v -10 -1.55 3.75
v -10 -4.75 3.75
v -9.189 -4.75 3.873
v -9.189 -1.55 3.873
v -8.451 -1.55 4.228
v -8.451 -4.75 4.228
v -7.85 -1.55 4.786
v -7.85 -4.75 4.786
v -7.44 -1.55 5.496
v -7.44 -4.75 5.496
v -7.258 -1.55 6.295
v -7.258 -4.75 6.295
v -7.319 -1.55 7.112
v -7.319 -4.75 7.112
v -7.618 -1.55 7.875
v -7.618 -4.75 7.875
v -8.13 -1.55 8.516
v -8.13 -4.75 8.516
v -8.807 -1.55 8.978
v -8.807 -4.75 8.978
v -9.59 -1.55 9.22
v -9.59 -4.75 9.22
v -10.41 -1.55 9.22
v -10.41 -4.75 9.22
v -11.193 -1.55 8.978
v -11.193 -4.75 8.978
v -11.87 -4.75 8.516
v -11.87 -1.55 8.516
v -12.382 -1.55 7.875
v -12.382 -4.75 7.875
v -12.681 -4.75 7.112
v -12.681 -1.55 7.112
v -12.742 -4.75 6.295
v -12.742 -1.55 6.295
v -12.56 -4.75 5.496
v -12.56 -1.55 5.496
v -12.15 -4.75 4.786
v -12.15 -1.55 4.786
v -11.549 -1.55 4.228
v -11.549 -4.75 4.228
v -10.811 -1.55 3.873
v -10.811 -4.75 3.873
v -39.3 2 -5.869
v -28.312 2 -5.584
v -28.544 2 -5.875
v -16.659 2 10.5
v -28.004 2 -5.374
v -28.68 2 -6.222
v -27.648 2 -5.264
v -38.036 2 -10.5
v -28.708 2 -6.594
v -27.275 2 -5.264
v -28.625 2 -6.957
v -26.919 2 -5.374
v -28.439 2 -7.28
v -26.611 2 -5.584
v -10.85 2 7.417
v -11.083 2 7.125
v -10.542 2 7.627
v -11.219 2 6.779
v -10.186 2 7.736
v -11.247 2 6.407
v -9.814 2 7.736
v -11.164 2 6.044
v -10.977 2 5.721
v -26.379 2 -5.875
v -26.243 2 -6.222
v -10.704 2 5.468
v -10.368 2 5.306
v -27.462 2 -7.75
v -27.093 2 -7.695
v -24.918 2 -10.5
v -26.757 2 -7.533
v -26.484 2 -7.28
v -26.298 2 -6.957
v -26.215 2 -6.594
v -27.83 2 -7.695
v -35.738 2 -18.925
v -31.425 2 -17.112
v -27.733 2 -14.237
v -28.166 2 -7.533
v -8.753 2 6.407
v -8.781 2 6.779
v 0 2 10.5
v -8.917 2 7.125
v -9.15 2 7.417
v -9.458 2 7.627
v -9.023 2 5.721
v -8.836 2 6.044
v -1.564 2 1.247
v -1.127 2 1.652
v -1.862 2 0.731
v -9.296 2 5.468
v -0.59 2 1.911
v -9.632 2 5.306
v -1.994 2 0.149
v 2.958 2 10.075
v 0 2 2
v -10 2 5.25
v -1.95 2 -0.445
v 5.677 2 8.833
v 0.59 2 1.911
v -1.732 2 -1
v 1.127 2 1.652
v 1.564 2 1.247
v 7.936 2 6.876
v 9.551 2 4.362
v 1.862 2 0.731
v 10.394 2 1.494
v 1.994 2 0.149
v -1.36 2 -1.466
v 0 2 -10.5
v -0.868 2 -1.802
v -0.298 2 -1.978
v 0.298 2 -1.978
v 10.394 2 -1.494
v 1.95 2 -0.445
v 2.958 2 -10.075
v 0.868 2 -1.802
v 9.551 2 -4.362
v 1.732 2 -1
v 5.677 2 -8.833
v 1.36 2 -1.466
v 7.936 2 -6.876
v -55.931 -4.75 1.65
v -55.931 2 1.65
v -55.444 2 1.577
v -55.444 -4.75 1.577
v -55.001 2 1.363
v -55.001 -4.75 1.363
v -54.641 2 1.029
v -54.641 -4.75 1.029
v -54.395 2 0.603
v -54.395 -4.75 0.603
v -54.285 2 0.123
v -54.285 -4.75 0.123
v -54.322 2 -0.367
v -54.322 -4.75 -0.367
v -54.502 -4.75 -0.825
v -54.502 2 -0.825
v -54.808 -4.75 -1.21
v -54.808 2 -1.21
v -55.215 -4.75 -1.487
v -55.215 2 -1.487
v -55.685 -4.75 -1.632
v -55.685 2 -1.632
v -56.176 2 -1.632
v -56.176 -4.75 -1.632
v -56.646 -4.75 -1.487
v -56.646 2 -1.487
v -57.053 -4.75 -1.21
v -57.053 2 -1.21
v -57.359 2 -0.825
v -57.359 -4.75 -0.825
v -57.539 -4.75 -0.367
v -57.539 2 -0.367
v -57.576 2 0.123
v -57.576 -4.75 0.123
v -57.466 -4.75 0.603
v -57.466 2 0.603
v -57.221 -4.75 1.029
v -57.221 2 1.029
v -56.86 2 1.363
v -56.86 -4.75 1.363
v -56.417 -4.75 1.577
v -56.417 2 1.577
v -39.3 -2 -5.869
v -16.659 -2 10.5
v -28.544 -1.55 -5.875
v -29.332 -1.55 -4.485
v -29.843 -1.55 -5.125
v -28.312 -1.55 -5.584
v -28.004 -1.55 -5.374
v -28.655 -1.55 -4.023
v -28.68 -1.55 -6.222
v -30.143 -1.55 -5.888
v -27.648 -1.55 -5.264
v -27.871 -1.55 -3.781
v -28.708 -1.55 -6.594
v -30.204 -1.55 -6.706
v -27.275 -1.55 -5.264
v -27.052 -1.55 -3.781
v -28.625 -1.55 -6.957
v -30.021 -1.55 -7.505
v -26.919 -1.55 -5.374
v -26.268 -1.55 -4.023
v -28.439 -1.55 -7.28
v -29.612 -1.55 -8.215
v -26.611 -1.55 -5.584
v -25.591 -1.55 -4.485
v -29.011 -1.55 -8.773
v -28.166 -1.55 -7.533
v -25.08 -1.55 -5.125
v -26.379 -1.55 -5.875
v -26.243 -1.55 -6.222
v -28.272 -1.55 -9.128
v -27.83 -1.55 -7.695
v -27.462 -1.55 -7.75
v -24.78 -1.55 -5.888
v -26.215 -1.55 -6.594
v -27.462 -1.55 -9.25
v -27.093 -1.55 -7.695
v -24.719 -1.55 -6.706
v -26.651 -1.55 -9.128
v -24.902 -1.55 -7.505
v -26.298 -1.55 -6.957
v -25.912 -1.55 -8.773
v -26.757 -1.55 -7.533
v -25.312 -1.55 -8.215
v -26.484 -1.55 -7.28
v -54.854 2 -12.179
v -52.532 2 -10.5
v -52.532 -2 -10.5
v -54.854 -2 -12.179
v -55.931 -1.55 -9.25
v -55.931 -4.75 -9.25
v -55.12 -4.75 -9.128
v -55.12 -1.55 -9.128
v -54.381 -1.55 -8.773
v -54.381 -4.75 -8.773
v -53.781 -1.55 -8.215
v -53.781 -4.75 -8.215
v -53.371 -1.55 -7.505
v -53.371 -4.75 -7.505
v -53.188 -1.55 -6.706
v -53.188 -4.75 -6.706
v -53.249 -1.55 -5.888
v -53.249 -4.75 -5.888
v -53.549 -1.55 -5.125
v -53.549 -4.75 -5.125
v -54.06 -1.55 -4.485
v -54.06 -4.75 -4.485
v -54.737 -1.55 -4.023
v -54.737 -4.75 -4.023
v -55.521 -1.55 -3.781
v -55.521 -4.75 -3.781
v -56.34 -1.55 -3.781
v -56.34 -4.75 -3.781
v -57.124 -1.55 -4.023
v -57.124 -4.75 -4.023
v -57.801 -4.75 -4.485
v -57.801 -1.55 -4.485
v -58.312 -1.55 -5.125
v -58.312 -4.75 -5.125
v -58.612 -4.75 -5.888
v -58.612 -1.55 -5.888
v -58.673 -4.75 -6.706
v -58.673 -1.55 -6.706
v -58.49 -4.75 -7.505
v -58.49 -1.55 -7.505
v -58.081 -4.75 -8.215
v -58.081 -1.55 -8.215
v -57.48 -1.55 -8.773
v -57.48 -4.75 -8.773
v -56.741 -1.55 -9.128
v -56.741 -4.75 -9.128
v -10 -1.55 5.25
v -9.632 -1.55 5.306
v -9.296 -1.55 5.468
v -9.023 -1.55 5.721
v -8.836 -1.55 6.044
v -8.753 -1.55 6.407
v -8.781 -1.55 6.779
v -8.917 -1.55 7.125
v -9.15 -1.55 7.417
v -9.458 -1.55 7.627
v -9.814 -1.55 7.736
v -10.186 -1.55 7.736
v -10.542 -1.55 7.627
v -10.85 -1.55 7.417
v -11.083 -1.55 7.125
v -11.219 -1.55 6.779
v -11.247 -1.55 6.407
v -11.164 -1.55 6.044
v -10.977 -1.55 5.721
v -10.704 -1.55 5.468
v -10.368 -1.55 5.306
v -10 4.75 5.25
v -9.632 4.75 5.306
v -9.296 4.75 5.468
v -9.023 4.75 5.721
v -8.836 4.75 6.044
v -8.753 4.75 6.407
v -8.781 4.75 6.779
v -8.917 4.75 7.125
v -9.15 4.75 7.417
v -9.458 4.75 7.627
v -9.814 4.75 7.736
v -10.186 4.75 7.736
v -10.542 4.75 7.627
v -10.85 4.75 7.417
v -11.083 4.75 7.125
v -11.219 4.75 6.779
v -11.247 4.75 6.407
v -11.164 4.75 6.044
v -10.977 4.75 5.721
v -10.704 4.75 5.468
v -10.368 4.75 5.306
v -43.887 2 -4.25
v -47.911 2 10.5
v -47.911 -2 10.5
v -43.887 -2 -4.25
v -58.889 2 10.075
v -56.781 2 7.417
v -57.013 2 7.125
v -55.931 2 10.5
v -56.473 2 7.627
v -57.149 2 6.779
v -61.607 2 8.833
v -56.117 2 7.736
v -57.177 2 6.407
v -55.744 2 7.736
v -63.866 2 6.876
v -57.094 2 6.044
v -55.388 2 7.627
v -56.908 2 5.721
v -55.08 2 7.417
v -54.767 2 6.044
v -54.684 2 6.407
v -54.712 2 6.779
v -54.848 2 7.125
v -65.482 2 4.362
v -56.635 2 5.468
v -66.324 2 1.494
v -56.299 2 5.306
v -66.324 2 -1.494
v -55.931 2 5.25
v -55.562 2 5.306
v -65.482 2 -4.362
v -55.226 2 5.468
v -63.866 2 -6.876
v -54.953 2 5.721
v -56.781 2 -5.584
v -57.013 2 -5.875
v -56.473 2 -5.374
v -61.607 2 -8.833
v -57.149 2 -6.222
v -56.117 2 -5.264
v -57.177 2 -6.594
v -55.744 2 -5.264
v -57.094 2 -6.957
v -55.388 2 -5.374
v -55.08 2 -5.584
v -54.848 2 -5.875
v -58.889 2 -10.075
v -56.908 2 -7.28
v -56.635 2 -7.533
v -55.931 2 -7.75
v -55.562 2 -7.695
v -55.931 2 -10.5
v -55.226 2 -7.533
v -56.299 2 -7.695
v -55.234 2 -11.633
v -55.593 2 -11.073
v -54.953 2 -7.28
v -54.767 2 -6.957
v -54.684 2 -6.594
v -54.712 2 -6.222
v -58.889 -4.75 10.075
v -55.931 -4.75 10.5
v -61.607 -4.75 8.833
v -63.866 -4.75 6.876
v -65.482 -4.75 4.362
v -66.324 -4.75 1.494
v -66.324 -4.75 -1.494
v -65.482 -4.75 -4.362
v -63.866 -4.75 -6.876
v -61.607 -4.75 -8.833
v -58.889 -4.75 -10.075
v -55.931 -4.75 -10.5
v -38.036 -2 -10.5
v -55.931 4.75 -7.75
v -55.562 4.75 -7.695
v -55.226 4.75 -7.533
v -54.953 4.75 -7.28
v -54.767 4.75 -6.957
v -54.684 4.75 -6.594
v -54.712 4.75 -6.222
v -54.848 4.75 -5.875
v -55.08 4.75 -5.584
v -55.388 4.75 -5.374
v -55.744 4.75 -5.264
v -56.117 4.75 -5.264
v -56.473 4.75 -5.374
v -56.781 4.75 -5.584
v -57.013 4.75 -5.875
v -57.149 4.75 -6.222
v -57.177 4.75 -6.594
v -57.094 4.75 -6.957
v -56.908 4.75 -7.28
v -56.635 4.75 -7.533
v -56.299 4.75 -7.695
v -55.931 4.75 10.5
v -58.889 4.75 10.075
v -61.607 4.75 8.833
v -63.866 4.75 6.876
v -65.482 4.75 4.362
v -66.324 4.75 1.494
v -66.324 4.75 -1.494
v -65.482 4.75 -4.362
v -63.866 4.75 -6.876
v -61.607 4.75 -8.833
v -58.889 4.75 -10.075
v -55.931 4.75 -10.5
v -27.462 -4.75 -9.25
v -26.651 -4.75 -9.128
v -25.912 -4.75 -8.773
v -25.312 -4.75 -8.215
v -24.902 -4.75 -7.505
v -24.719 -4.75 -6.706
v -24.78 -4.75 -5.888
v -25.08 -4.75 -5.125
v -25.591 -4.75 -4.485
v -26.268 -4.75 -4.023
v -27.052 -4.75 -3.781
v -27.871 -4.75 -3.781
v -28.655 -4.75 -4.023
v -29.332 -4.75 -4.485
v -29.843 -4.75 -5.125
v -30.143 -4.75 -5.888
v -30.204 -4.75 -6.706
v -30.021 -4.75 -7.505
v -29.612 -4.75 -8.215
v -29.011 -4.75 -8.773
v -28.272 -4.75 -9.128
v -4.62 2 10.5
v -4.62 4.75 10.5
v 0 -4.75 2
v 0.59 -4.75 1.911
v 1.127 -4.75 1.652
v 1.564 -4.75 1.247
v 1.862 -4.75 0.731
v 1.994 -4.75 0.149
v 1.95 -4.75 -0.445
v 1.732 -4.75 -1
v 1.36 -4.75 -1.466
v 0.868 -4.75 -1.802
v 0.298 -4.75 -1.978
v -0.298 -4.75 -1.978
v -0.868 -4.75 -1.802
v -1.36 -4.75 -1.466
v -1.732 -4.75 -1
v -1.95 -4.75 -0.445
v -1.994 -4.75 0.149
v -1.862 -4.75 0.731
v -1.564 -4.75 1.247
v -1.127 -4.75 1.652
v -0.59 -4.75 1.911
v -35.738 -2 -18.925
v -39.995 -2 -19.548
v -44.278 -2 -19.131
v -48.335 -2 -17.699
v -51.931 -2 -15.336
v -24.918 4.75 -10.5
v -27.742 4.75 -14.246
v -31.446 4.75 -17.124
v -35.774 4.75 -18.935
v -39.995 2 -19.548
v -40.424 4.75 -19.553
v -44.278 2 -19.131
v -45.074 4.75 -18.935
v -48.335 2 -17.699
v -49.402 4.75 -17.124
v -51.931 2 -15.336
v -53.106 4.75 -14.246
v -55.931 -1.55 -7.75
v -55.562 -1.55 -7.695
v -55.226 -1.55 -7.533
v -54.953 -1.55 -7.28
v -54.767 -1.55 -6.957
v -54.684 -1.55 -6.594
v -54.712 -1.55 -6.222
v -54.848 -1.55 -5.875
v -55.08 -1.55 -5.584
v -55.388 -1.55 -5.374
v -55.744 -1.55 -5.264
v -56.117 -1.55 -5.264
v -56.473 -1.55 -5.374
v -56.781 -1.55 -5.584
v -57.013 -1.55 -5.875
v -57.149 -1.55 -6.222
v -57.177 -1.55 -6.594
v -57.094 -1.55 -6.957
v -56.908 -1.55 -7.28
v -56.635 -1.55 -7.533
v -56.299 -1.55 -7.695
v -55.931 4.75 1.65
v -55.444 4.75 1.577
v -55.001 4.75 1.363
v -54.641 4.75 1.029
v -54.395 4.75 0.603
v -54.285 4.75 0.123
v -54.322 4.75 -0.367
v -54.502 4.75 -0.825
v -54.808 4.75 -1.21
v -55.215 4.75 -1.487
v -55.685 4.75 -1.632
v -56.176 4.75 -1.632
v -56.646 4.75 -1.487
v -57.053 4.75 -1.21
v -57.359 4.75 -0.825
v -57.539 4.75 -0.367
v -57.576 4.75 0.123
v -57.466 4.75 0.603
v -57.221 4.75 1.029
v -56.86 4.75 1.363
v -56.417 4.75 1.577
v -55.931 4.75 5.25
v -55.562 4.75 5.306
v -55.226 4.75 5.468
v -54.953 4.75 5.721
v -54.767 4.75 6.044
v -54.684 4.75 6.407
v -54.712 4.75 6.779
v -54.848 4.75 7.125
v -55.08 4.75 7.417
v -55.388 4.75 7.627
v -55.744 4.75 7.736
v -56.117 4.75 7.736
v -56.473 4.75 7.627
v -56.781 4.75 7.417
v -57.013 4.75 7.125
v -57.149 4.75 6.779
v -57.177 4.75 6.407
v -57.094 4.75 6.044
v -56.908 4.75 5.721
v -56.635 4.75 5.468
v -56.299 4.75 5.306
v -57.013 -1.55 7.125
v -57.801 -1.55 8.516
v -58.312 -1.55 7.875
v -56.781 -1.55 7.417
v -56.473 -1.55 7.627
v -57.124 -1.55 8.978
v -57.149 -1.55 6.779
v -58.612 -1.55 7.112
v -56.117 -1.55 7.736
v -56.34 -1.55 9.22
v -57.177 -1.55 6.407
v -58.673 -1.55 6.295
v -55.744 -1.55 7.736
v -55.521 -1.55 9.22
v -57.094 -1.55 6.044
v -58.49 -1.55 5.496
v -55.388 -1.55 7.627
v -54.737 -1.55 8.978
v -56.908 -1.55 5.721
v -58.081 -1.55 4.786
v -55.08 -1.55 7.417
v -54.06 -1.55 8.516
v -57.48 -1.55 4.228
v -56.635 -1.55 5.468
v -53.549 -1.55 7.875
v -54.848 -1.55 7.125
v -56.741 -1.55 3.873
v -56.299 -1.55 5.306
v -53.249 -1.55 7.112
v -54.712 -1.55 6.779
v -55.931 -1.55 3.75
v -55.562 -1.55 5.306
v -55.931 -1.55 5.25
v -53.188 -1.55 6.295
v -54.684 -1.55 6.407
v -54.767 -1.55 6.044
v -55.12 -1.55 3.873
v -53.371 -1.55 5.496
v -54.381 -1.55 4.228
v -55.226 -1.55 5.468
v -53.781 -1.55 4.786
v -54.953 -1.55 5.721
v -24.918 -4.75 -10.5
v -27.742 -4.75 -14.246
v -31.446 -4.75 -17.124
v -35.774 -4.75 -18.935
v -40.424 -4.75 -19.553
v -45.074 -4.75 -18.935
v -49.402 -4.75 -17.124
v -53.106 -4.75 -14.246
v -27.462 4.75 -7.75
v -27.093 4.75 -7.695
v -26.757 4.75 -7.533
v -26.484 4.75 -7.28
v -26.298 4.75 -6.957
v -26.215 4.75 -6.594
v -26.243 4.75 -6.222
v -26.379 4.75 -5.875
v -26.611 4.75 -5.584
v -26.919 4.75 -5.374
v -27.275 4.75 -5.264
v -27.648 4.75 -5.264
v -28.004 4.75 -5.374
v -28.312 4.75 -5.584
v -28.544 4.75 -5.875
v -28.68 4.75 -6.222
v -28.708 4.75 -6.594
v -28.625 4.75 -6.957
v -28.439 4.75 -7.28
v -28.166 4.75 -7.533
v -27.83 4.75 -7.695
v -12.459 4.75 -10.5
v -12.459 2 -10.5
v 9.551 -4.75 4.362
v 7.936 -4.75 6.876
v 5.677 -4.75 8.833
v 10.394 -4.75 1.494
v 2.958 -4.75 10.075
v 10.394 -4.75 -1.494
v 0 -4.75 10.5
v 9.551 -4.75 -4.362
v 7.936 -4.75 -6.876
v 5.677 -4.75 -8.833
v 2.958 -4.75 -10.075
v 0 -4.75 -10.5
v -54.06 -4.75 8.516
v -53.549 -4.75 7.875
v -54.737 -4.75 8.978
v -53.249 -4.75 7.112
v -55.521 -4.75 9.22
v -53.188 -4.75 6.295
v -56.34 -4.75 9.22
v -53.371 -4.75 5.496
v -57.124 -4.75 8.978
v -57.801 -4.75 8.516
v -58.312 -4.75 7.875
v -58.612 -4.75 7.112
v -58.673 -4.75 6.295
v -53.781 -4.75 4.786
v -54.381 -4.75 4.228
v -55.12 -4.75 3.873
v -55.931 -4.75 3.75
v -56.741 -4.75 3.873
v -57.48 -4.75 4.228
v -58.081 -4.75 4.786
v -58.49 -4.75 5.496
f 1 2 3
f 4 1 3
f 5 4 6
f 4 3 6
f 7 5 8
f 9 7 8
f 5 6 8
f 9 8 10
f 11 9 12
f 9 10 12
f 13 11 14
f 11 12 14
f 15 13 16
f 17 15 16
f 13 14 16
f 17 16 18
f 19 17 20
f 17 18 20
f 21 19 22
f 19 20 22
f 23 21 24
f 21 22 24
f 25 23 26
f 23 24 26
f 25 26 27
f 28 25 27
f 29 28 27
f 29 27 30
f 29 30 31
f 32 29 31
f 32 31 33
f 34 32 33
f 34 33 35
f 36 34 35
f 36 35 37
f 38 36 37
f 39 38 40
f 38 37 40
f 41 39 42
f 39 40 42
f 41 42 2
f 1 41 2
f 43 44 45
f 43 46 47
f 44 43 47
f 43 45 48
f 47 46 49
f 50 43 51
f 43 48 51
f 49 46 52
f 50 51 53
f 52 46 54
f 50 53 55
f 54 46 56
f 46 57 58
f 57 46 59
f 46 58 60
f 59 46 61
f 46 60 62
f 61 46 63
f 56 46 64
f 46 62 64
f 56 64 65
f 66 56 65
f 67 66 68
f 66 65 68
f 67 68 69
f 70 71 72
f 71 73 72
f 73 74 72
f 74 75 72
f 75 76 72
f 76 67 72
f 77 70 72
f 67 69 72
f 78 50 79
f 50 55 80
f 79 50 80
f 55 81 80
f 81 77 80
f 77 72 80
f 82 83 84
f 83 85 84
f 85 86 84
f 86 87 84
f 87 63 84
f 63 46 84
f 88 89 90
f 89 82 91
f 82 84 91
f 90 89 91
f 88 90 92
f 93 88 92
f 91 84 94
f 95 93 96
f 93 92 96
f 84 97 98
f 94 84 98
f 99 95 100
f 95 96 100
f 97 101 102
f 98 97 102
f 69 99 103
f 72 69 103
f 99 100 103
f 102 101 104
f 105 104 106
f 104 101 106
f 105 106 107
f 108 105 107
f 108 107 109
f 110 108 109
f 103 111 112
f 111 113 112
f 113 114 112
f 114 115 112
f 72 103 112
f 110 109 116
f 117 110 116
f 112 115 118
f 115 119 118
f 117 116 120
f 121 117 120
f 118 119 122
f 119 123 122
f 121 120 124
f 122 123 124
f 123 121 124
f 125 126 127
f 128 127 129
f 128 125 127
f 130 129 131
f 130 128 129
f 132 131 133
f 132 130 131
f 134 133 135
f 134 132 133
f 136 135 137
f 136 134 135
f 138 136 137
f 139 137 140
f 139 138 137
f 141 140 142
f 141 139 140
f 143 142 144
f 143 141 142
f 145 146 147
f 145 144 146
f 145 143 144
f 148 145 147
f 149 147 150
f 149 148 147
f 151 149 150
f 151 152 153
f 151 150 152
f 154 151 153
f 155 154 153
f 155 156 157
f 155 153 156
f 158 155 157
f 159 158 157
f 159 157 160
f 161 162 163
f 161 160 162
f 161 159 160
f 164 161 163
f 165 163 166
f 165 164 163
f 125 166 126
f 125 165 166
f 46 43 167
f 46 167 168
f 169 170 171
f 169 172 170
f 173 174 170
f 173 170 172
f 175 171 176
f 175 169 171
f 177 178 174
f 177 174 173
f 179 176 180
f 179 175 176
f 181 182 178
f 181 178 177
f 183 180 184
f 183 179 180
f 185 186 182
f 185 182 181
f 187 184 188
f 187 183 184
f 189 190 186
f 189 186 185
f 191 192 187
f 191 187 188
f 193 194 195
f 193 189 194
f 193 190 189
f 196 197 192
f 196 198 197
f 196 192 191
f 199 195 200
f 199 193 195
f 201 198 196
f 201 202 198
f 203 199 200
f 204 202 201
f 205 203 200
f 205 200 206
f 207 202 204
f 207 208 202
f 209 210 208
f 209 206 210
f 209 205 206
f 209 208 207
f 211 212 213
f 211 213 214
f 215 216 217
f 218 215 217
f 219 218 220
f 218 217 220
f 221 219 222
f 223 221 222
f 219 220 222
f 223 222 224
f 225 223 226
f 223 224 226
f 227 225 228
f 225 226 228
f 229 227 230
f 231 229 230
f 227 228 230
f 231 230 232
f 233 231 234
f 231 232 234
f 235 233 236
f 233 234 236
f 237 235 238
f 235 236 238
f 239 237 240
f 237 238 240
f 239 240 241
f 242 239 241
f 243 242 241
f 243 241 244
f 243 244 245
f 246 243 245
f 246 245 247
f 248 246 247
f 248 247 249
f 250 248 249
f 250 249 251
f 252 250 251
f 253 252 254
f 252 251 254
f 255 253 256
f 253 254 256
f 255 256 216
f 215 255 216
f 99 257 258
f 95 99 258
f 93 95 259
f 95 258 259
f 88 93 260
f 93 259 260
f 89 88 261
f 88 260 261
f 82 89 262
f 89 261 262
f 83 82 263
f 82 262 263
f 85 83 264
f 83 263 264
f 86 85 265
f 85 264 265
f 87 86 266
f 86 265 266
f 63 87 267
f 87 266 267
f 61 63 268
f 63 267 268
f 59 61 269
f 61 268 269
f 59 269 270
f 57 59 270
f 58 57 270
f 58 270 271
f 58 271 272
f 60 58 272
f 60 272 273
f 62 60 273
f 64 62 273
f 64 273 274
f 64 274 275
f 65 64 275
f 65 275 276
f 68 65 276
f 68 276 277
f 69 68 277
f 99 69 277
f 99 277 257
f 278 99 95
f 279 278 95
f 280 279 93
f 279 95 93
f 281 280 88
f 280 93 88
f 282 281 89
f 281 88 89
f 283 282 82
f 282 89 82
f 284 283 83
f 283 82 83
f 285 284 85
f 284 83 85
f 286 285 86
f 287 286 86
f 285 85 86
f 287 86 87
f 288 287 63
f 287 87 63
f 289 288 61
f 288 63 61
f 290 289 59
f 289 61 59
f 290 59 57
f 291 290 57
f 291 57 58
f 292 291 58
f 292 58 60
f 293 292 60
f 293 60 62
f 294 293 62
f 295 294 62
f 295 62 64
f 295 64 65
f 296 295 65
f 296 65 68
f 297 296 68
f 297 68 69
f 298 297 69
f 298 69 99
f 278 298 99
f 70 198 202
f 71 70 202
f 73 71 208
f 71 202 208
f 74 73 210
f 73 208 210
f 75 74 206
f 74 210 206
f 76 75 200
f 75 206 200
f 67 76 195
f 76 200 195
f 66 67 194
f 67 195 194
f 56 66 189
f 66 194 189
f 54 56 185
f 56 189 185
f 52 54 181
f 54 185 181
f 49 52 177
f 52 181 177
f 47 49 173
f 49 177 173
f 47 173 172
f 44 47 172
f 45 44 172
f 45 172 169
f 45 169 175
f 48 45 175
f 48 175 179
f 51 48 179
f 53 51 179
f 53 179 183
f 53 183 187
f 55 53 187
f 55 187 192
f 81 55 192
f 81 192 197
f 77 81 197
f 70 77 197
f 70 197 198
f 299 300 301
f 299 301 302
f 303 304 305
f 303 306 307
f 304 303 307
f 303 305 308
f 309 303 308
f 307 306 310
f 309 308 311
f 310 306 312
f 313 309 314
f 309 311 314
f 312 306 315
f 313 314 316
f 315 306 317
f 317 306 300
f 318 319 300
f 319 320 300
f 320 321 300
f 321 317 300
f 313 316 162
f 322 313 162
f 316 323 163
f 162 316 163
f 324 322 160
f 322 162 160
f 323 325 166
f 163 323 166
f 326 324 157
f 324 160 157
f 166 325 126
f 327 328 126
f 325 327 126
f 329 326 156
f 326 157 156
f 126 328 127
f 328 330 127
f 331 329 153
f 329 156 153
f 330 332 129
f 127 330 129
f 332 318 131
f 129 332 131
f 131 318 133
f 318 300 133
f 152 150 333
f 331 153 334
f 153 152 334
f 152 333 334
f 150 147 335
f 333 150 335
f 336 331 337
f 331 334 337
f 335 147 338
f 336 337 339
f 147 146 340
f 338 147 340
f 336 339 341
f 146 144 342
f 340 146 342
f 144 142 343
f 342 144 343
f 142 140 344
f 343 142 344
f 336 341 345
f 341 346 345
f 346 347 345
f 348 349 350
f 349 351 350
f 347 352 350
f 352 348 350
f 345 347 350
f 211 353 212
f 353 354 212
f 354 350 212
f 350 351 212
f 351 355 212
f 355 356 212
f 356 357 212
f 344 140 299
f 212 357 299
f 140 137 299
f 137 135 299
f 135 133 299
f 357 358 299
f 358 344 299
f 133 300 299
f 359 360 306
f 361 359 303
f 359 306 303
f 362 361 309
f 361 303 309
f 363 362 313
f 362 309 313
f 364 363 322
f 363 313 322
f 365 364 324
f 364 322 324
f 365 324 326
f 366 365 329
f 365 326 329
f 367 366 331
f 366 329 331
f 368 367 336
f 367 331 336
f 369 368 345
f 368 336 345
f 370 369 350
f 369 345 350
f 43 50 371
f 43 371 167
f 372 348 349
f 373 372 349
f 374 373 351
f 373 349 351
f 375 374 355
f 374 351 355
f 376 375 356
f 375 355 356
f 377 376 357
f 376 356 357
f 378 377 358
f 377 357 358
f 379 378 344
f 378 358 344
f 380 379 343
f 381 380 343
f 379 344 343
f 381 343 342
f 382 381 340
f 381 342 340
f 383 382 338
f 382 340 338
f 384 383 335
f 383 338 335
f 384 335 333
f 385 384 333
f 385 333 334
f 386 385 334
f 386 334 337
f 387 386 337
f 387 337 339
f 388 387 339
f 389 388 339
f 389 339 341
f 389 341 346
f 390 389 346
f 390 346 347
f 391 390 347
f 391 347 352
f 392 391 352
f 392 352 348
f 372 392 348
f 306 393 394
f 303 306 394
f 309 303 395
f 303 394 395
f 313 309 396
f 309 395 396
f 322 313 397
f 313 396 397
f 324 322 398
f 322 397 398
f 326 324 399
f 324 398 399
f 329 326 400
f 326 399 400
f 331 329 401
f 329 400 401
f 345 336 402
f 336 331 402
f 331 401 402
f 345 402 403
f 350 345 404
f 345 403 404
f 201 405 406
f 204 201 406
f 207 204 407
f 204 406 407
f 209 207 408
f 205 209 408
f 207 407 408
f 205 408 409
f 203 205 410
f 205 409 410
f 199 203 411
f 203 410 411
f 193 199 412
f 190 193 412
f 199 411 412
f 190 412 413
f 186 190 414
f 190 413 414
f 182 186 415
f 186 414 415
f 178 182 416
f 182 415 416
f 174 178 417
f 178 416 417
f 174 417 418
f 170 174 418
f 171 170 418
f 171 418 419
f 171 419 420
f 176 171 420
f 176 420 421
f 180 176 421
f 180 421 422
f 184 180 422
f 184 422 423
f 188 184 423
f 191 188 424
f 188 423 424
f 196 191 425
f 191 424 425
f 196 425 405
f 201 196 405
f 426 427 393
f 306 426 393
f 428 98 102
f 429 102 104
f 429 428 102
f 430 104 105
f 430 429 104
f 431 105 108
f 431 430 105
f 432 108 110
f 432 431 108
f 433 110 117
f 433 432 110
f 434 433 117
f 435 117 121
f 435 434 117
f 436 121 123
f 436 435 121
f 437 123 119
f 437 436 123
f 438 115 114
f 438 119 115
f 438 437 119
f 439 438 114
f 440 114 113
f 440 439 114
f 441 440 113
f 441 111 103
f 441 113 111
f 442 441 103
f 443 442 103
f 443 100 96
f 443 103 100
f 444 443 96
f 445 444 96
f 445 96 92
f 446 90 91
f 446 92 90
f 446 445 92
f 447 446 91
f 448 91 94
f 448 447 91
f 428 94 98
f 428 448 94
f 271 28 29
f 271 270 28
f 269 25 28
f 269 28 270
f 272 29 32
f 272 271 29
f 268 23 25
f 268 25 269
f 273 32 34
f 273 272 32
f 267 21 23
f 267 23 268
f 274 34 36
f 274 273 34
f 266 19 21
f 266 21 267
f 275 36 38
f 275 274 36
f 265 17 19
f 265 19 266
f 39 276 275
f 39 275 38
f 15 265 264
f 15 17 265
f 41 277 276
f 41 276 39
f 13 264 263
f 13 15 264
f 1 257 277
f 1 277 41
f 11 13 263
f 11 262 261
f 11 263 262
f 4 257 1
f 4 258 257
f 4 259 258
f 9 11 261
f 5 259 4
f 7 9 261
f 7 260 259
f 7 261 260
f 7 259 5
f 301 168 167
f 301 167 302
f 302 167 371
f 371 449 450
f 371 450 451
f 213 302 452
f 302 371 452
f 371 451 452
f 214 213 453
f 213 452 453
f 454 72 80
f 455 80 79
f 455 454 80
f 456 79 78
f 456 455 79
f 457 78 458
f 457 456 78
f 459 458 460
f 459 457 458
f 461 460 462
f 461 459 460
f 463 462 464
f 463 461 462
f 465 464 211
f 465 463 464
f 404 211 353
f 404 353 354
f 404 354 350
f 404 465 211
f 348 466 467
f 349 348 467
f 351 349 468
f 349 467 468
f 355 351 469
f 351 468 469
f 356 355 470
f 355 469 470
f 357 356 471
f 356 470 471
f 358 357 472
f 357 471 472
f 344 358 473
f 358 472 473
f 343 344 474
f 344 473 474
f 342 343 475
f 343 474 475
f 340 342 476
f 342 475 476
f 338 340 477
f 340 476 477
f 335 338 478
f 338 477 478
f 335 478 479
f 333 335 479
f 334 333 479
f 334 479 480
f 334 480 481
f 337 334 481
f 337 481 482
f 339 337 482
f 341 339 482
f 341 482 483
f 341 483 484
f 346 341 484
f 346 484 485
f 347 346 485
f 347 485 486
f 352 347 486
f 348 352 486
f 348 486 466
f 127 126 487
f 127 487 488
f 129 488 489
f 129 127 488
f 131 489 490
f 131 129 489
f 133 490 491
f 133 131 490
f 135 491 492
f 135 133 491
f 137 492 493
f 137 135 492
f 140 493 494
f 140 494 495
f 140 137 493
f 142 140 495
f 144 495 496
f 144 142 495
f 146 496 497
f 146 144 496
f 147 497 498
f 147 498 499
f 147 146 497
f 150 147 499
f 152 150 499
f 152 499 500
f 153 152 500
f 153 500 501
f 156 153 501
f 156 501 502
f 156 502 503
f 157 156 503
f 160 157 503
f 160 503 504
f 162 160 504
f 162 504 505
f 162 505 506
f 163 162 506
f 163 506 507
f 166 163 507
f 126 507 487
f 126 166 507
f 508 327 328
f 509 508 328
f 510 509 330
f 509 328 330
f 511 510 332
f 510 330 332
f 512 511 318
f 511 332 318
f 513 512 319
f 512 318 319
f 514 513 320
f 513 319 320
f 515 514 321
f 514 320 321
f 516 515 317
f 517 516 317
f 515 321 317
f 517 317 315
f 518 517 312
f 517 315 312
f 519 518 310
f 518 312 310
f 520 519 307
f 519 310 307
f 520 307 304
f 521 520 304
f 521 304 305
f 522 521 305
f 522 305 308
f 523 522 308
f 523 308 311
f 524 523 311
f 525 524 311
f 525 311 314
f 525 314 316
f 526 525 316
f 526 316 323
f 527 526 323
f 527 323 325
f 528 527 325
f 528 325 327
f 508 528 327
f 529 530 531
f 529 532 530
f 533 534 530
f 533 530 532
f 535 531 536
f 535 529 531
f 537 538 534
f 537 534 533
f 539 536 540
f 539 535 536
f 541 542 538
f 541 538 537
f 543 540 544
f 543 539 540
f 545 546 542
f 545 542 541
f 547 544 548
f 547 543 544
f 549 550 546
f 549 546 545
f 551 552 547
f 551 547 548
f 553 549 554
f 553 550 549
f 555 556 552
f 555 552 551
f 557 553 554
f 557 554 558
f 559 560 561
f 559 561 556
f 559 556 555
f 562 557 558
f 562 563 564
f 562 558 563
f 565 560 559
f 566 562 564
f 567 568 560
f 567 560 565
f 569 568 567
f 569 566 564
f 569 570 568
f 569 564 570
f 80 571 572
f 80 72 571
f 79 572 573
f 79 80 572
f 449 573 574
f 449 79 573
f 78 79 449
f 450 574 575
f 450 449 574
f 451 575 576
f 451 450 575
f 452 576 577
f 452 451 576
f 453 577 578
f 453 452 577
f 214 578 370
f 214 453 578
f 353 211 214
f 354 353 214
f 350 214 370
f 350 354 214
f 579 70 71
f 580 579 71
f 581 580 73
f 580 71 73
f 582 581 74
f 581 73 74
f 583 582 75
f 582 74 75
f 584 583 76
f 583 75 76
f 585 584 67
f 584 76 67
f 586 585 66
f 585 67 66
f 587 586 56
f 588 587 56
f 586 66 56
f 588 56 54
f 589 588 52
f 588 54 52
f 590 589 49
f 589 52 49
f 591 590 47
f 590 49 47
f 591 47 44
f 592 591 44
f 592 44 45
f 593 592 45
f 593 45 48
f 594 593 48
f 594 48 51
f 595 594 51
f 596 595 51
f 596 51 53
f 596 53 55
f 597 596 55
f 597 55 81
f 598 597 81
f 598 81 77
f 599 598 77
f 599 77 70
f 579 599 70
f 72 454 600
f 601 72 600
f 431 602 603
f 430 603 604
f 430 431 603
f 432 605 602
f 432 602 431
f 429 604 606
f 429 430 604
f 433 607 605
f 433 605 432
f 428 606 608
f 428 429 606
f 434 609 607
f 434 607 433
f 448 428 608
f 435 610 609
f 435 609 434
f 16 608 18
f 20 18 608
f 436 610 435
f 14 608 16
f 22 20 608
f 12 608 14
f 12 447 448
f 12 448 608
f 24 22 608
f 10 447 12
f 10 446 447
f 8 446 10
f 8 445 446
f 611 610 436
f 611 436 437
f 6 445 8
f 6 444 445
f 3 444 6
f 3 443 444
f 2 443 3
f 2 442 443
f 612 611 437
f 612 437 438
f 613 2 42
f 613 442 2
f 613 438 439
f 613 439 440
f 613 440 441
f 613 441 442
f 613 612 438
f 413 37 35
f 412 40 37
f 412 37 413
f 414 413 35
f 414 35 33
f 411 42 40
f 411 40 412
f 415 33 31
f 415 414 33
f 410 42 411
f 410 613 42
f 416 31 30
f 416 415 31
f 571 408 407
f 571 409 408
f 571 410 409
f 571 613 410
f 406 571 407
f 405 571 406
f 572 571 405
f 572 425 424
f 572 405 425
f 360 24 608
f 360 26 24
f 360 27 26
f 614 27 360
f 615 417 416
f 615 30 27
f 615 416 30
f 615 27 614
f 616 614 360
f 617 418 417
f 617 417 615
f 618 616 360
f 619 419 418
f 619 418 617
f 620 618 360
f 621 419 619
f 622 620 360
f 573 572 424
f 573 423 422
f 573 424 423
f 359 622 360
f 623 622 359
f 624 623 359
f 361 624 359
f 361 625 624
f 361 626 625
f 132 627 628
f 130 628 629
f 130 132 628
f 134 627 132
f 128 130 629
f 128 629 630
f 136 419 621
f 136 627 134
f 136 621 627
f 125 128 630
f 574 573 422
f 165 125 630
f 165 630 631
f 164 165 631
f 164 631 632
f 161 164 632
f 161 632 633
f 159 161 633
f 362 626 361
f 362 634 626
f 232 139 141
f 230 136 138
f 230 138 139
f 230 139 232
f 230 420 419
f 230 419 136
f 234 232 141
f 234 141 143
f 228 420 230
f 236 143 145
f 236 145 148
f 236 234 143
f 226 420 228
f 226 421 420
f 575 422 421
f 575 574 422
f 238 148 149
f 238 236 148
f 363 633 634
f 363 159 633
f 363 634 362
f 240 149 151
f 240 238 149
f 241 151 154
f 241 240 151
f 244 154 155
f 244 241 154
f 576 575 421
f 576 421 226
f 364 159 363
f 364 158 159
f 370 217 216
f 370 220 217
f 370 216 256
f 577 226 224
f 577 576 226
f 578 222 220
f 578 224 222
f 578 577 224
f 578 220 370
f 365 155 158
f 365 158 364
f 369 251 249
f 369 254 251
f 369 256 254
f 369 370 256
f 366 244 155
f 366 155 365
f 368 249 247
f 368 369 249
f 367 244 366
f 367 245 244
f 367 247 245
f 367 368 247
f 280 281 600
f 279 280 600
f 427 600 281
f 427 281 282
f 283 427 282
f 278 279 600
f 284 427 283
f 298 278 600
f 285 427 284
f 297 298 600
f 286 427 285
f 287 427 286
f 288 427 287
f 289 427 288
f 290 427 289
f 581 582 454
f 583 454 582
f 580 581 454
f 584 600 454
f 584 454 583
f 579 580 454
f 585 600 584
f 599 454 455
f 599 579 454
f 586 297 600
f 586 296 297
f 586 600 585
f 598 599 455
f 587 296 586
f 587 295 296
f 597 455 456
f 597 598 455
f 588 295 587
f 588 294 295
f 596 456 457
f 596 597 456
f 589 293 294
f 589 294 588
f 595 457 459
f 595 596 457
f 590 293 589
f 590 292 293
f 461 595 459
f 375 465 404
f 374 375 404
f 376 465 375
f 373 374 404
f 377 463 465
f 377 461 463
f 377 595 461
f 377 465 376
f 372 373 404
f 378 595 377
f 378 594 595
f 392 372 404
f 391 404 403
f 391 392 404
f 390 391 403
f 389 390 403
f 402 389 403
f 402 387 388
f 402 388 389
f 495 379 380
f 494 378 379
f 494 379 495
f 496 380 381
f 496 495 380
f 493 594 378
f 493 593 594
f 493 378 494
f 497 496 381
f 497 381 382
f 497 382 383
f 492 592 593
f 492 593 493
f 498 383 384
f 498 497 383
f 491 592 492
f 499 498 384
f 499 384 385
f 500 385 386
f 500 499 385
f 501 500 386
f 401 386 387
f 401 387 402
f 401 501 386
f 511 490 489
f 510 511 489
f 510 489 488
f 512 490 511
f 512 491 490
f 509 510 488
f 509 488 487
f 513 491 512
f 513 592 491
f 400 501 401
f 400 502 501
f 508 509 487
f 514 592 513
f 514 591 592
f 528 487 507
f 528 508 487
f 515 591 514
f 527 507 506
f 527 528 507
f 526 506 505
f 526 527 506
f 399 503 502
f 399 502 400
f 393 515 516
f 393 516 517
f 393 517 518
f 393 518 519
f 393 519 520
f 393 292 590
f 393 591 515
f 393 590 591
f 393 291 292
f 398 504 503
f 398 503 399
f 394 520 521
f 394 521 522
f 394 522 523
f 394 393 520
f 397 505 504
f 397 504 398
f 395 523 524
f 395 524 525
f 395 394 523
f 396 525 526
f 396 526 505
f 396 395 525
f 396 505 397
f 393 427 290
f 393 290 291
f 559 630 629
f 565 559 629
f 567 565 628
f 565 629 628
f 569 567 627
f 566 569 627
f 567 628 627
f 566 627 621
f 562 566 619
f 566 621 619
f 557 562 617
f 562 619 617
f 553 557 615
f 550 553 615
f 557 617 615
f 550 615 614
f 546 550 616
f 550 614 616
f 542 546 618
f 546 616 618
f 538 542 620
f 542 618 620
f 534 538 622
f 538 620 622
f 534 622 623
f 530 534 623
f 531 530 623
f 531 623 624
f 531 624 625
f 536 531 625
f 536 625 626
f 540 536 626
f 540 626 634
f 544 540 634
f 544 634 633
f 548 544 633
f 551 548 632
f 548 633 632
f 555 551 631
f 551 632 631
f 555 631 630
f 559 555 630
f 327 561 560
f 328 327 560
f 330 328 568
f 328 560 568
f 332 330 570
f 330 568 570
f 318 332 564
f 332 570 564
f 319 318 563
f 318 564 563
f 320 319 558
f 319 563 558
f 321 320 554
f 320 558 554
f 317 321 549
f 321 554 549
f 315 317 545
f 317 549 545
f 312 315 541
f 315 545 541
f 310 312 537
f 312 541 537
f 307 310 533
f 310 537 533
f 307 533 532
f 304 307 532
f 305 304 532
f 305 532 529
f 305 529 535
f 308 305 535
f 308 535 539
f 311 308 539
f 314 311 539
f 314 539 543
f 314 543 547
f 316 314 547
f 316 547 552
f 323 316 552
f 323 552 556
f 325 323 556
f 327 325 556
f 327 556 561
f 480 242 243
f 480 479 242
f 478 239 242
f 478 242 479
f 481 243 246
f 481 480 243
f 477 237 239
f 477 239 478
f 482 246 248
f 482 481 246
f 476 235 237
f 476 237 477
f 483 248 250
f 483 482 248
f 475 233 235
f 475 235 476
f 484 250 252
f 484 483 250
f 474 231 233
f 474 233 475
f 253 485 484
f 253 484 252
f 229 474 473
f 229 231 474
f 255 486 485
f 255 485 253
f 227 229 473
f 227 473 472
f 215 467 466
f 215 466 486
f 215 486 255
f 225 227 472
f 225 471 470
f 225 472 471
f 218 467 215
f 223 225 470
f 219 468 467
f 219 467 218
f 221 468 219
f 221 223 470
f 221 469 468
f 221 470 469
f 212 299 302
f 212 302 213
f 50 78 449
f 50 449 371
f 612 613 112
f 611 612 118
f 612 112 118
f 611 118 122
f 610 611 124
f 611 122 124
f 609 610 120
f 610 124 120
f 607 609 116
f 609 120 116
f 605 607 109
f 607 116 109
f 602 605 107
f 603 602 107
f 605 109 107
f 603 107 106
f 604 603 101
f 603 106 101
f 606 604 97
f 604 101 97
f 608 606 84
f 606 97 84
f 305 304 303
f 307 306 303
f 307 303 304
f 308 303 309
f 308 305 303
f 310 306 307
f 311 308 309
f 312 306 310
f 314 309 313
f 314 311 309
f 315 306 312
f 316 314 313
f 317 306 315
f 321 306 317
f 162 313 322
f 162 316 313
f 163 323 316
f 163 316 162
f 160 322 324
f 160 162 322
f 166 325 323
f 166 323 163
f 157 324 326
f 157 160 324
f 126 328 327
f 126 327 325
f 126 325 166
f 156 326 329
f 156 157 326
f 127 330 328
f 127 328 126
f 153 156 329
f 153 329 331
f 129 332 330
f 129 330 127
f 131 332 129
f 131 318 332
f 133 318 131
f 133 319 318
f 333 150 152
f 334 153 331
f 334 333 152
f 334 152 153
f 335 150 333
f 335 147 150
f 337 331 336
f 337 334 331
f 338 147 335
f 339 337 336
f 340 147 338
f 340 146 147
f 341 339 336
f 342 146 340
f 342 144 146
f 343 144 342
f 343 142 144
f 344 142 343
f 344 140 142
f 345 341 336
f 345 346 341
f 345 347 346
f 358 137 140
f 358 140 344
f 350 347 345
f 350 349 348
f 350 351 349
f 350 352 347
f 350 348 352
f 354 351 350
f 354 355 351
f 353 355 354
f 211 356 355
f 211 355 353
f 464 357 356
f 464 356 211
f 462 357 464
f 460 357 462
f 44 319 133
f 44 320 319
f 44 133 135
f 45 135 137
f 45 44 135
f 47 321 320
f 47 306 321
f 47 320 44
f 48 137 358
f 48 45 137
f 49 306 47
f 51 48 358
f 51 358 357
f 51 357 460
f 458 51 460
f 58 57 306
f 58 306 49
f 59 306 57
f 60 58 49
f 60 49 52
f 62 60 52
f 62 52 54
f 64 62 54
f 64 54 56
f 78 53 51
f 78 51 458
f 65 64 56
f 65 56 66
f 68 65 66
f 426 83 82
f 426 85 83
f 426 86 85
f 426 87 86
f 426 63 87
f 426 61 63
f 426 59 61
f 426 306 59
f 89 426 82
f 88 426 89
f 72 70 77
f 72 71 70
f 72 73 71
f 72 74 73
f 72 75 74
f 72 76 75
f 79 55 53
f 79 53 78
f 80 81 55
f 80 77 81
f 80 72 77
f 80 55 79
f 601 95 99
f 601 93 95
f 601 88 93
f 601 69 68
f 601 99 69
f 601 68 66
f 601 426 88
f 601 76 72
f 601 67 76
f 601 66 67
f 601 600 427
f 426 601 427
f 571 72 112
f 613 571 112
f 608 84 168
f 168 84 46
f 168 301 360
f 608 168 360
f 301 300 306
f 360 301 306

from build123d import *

# Parameters (mm, degrees)
SKETCH1_R                       = 2
SKETCH1_R_2                     = 1.65
BOSS_EXTRUDE1_DEPTH             = 4.75
CUT_EXTRUDE1_DEPTH              = 2
BOSS_EXTRUDE2_REACH             = 69.423
BOSS_EXTRUDE2_DIRECTION_2_REACH = 69.423
CUT_EXTRUDE2_DEPTH              = 2
SKETCH7_R                       = 1.25
CUT_EXTRUDE3_DEPTH              = 70.897349716
SKETCH8_R                       = 2.75
CUT_EXTRUDE4_DEPTH              = 3.2
CUT_EXTRUDE5_DEPTH              = 2.75


with BuildPart() as part:
    # Sketch1 → Boss-Extrude1 (new, symmetric)
    with BuildSketch(Plane(origin=(0, 0, 0), x_dir=(1, 0, 0), z_dir=(0, 1, 0))):
        with BuildLine():
            Line((0, -10.500399217), (-55.93053828, -10.500399217))
            ThreePointArc((-55.93053828, -10.500399217), (-66.430937497, 0), (-55.93053828, 10.500399217))
            Line((-55.93053828, 10.500399217), (0, 10.500399217))
            ThreePointArc((0, 10.500399217), (10.500399217, 0), (0, -10.500399217))
        make_face()
        with Locations(Location((0, 0, 0), (0, 0, 270))):
            Circle(SKETCH1_R, mode=Mode.SUBTRACT)
        with Locations(Location((-55.93053828, 0, 0), (0, 0, 270))):
            Circle(SKETCH1_R_2, mode=Mode.SUBTRACT)
    extrude(amount=BOSS_EXTRUDE1_DEPTH, both=True)

    # Sketch3 → Cut-Extrude1 (cut, symmetric)
    with BuildSketch(Plane(origin=(0, 0, 0), x_dir=(1, 0, 0), z_dir=(0, 1, 0))):
        with BuildLine():
            Line((-35.751827911, 18.875253657), (-39.299525946, 5.868950542))
            Line((-39.299525946, 5.868950542), (26.645239155, -41.810424095))
            ThreePointArc((26.645239155, -41.810424095), (-18.563858299, -45.972421055), (-48.206523525, -11.584965354))
            Line((-48.206523525, -11.584965354), (-43.887265107, 4.249974277))
            Line((-43.887265107, 4.249974277), (-54.812276631, 12.148974547))
            ThreePointArc((-54.812276631, 12.148974547), (-46.585078234, 19.204535889), (-35.751827911, 18.875253657))
        make_face()
    extrude(amount=CUT_EXTRUDE1_DEPTH, both=True, mode=Mode.SUBTRACT)

    # Boss-Extrude2: up to this face of the body (flat: up to its plane)
    boss_extrude2_end = Plane(part.part.faces().sort_by_distance((-28.040100034, 4.75, 0))[0])
    # Sketch5 → Boss-Extrude2 (add, up to the picked face)
    with BuildSketch(Plane(origin=(0, 0, 0), x_dir=(1, 0, 0), z_dir=(0, 1, 0)), mode=Mode.PRIVATE) as boss_extrude2_sk1:
        with BuildLine():
            ThreePointArc((-24.917700351, 10.500399217), (-40.424119316, 19.553005923), (-55.93053828, 10.500399217))
            Line((-55.93053828, 10.500399217), (-24.917700351, 10.500399217))
        make_face()
    boss_extrude2_tool1 = split(extrude(boss_extrude2_sk1.sketch, amount=BOSS_EXTRUDE2_REACH, mode=Mode.PRIVATE), bisect_by=boss_extrude2_end, keep=Keep.BOTH, mode=Mode.PRIVATE)
    add(boss_extrude2_tool1.solids().sort_by(Axis((-40.424119, 0, -14.214125), (0, 1, 0)))[0])

    # Boss-Extrude2 direction 2: up to this face of the body (flat: up to its plane)
    boss_extrude2_direction_2_end = Plane(part.part.faces().sort_by_distance((-28.040100034, -4.75, 0))[0])
    # Sketch5 → Boss-Extrude2 direction 2 (add, up to the picked face)
    with BuildSketch(Plane(origin=(0, 0, 0), x_dir=(1, 0, 0), z_dir=(0, 1, 0)), mode=Mode.PRIVATE) as boss_extrude2_direction_2_sk1:
        with BuildLine():
            ThreePointArc((-24.917700351, 10.500399217), (-40.424119316, 19.553005923), (-55.93053828, 10.500399217))
            Line((-55.93053828, 10.500399217), (-24.917700351, 10.500399217))
        make_face()
    boss_extrude2_direction_2_tool1 = split(extrude(boss_extrude2_direction_2_sk1.sketch, amount=-BOSS_EXTRUDE2_DIRECTION_2_REACH, mode=Mode.PRIVATE), bisect_by=boss_extrude2_direction_2_end, keep=Keep.BOTH, mode=Mode.PRIVATE)
    add(boss_extrude2_direction_2_tool1.solids().sort_by(Axis((-40.424119, 0, -14.214125), (0, -1, 0)))[0])

    # Sketch6 → Cut-Extrude2 (cut, symmetric)
    with BuildSketch(Plane(origin=(0, 0, 0), x_dir=(1, 0, 0), z_dir=(0, 1, 0))):
        with BuildLine():
            Line((-39.299525946, 5.868950542), (-16.659276721, -10.500399217))
            Line((-16.659276721, -10.500399217), (-47.910689027, -10.500399217))
            Line((-47.910689027, -10.500399217), (-43.887265107, 4.249974277))
            Line((-43.887265107, 4.249974277), (-54.854382526, 12.179417945))
            ThreePointArc((-54.854382526, 12.179417945), (-46.349897212, 18.538096729), (-35.738154791, 18.925381021))
            Line((-35.738154791, 18.925381021), (-39.299525946, 5.868950542))
        make_face()
    extrude(amount=CUT_EXTRUDE2_DEPTH, both=True, mode=Mode.SUBTRACT)

    # Sketch7 → Cut-Extrude3 (cut, through all)
    with BuildSketch(Plane.XZ.offset(4.75)):
        with Locations(Location((-27.461551073, -6.500399217, 0), (0, 0, 270))):
            Circle(SKETCH7_R)
        with Locations(Location((-10, 6.500399217, 0), (0, 0, 270))):
            Circle(SKETCH7_R)
        with Locations(Location((-55.93053828, 6.500399217, 0), (0, 0, 270))):
            Circle(SKETCH7_R)
        with Locations(Location((-55.93053828, -6.500399217, 0), (0, 0, 270))):
            Circle(SKETCH7_R)
    extrude(amount=-CUT_EXTRUDE3_DEPTH, mode=Mode.SUBTRACT)

    # Sketch8 → Cut-Extrude4 (cut)
    with BuildSketch(Plane.XZ.offset(4.75)):
        with Locations(Location((-55.93053828, 6.500399217, 0), (0, 0, 270))):
            Circle(SKETCH8_R)
        with Locations(Location((-55.93053828, -6.500399217, 0), (0, 0, 270))):
            Circle(SKETCH8_R)
        with Locations(Location((-27.461551073, -6.500399217, 0), (0, 0, 270))):
            Circle(SKETCH8_R)
        with Locations(Location((-10, 6.500399217, 0), (0, 0, 270))):
            Circle(SKETCH8_R)
    extrude(amount=-CUT_EXTRUDE4_DEPTH, mode=Mode.SUBTRACT)

    # Sketch9 → Cut-Extrude5 (cut)
    with BuildSketch(Plane(origin=(0, 4.75, 0), x_dir=(1, 0, 0), z_dir=(0, 1, 0))):
        with BuildLine():
            Line((-12.458850176, 10.500399217), (-4.619547141, -10.500399217))
            Line((-4.619547141, -10.500399217), (0, -10.500399217))
            ThreePointArc((0, -10.500399217), (10.500399217, 0), (0, 10.500399217))
            Line((0, 10.500399217), (-12.458850176, 10.500399217))
        make_face()
    extrude(amount=-CUT_EXTRUDE5_DEPTH, mode=Mode.SUBTRACT)


with BuildPart() as body_2:
    # Split1: the piece on the far side of the plane
    add(part.part)
    split(bisect_by=Plane(origin=(0, 2, 0), x_dir=(0, 0, -1), z_dir=(0, -1, 0)), keep=Keep.BOTTOM)


with BuildPart() as part_1:
    add(part.part)

    # Split1
    split(bisect_by=Plane(origin=(0, 2, 0), x_dir=(0, 0, -1), z_dir=(0, -1, 0)), keep=Keep.TOP)


solid = Compound([body_2.part, part_1.part])
